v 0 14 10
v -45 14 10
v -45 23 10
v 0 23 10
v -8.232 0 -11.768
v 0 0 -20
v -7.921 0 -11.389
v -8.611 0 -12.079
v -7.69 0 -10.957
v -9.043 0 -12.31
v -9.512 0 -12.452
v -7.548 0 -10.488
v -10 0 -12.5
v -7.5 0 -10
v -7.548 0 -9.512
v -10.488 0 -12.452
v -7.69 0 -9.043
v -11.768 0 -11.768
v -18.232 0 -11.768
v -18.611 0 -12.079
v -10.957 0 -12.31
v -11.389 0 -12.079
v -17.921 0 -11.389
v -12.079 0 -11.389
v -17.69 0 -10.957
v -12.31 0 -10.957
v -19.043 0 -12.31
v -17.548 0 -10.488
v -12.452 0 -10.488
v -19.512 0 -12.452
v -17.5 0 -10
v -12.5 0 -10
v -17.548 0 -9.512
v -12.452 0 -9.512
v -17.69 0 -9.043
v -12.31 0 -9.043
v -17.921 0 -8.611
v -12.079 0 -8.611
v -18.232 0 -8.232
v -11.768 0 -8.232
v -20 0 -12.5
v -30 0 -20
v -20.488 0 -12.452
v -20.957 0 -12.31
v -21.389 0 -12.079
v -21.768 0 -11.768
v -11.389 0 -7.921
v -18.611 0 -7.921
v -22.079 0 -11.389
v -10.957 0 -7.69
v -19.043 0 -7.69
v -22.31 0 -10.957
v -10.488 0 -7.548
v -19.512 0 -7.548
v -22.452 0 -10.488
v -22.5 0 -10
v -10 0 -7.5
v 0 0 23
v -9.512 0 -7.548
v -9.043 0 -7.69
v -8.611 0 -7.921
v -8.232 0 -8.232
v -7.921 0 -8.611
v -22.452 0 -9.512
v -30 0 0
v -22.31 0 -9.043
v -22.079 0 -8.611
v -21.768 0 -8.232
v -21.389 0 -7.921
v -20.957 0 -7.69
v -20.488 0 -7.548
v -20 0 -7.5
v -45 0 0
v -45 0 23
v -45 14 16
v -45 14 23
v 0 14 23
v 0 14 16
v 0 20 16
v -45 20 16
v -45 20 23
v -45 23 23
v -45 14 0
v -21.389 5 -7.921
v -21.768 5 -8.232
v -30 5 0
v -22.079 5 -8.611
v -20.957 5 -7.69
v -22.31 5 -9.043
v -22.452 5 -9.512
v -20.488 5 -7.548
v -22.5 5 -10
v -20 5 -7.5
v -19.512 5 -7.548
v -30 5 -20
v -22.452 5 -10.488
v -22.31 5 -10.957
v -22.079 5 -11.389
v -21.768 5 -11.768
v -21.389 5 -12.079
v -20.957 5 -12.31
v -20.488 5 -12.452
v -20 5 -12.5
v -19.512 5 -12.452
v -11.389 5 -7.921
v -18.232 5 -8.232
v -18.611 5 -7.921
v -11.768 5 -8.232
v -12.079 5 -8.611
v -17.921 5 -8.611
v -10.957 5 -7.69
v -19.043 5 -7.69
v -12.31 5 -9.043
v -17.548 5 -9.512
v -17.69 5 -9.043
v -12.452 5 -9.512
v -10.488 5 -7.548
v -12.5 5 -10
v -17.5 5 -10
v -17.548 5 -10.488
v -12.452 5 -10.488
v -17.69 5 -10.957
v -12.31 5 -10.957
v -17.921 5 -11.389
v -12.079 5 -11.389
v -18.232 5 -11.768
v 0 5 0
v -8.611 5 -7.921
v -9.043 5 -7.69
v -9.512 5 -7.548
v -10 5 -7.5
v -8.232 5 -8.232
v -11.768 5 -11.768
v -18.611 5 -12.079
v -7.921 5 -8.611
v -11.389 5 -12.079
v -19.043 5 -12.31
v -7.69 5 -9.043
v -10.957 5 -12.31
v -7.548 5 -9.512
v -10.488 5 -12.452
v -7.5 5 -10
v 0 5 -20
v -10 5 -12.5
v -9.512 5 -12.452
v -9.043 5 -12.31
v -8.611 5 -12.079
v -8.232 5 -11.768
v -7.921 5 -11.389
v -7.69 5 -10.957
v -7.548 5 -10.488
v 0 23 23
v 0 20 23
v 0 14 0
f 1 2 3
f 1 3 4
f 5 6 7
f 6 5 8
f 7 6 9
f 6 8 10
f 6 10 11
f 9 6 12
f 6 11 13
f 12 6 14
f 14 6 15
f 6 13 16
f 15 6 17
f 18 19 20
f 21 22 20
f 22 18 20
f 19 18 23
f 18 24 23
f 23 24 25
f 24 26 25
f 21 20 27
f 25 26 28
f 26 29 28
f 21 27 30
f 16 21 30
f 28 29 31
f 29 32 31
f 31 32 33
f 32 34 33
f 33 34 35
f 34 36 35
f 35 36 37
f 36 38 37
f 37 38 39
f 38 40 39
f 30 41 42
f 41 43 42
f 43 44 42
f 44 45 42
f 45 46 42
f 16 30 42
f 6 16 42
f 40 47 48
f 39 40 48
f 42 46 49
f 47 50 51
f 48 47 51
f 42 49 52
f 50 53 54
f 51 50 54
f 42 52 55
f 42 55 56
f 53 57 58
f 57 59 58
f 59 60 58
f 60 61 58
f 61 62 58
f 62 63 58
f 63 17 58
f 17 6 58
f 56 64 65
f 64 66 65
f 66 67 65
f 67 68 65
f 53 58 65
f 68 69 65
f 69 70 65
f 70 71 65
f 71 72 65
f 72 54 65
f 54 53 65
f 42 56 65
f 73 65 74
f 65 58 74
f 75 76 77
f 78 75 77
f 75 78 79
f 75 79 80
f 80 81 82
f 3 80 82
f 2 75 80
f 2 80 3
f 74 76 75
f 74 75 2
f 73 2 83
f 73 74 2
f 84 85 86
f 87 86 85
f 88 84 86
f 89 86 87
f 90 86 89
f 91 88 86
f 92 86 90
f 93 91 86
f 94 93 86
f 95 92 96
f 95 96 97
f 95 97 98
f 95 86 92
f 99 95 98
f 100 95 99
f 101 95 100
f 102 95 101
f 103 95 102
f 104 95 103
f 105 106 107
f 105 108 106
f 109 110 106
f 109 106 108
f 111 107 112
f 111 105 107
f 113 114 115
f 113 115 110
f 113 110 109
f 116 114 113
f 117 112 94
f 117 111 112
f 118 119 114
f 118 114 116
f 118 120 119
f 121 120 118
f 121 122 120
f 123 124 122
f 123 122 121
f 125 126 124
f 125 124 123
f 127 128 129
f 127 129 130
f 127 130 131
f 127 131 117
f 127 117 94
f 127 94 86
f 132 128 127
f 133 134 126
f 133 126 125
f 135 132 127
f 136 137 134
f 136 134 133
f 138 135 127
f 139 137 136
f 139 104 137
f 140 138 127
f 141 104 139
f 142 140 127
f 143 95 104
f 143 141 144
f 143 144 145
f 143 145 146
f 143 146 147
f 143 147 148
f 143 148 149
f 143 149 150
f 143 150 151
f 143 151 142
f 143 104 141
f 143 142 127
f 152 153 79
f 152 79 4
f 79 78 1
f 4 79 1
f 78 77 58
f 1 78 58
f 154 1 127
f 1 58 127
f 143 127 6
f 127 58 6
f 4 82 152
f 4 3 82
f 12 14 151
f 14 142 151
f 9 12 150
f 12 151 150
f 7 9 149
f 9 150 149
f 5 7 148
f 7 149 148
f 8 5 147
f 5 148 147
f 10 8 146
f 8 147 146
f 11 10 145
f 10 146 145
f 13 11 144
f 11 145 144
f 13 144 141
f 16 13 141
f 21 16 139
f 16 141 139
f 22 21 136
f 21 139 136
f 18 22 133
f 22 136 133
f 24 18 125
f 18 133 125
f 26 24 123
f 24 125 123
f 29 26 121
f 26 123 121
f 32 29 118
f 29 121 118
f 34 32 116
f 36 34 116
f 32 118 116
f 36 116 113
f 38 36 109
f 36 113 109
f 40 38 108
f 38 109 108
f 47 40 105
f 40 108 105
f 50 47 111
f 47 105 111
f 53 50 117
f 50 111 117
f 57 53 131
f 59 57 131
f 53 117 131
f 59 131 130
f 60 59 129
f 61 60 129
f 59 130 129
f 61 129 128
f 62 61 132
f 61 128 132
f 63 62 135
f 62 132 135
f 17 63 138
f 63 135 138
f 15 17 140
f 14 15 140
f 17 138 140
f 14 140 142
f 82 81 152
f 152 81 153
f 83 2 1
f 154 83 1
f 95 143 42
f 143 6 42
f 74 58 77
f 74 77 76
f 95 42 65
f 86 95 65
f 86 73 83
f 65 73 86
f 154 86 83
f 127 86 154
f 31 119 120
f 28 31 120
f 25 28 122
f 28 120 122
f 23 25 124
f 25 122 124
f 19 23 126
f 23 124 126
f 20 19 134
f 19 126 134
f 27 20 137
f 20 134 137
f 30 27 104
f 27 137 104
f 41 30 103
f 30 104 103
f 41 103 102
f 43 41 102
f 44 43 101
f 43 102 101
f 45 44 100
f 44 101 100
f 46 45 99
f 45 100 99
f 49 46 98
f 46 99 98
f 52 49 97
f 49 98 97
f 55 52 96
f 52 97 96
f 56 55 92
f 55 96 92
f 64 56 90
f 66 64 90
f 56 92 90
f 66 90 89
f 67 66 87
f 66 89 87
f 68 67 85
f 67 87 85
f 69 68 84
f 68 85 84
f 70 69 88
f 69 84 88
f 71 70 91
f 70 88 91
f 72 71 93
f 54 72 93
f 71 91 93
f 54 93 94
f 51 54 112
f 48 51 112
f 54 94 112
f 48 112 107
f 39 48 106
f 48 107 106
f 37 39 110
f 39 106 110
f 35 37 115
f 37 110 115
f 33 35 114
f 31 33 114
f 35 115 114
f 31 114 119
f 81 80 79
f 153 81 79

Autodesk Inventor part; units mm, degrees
ref_plane "YZ Plane" through (0, 0, 0) normal (1, 0, 0) x (0, 1, 0)
ref_plane "XZ Plane" through (0, 0, 0) normal (0, 1, 0) x (-1, 0, 0)
ref_plane "XY Plane" through (0, 0, 0) normal (0, 0, 1) x (1, 0, 0)
sketch "Esboço1" plane through (0, 0, 0) normal (0, 1, 0) x (-1, 0, 0)
  line L0 (0, 0) -> (0, -20)
  line L1 (0, -20) -> (30, -20)
  line L2 (30, -20) -> (30, 0)
  line L3 (30, 0) -> (0, 0)
  circle A0 centre (15, -10) radius 2.5
  dimension "d0" = 20
  dimension "d1" = 30
  dimension "d2" = 5
extrude "Extrusão1" add sketch "Esboço1" along normal blind 5
sketch "Esboço2" plane through (0, 0, 0) normal (0, -1, 0) x (1, 0, 0)
  line L0 (0, 0) -> (0, 23)
  line L1 (0, 23) -> (-45, 23)
  line L2 (-45, 23) -> (-45, 0)
  line L3 (-45, 0) -> (0, 0)
  dimension "d5" = 23
  dimension "d6" = 45
extrude "Extrusão2" add sketch "Esboço2" against normal blind 14
sketch "Esboço3" plane through (0, 14, 0) normal (0, 1, 0) x (1, 0, 0)
  line L0 (0, -23) -> (0, 20) projected
  line L1 (0, -23) -> (0, -16)
  line L2 (0, -16) -> (-45, -16)
  line L3 (-45, 0) -> (-45, -23) projected
  line L4 (-45, -16) -> (-45, -10)
  line L5 (-45, -10) -> (0, -10)
  line L6 (0, -10) -> (0, -16)
  point P0 (0, 0)
  dimension "d9" = 7
  dimension "d10" = 6
extrude "Extrusão3" add sketch "Esboço3" along normal blind 6
sketch "Esboço4" plane through (0, 20, 0) normal (0, 1, 0) x (1, 0, 0)
  line L0 (-45, -10) -> (0, -10) projected
  line L1 (-45, -23) -> (-45, 0) projected
  line L2 (-45, -10) -> (-45, -23)
  line L3 (-45, -23) -> (0, -23) projected
  line L4 (-45, -23) -> (0, -23)
  line L5 (0, -16) -> (0, -10) projected
  line L6 (0, -23) -> (0, -10)
  line L7 (0, -10) -> (-45, -10)
  point P0 (0, 0)
extrude "Extrusão4" add sketch "Esboço4" along normal blind 3
sketch "Esboço5" plane through (-45, 0, 0) normal (-1, 0, 0) x (0, 0, 1)
  line L0 (10, 14) -> (12.7, 14)
  line L1 (12.7, 14) -> (12.7, 9.5)
  line L2 (12.7, 9.5) -> (10, 9.5)
  line L3 (10, 14) -> (10, 23) projected
  line L4 (10, 9.5) -> (10, 14)
  point P0 (0, 0)
  dimension "d15" = 2.7
  dimension "d16" = 4.5
extrude "Extrusão5" add sketch "Esboço5" along normal blind 10
offset faces "Tamanho1" outward -10 faces at (-55, 12.5, 10.9)
sketch "Esboço6" plane through (0, 5, 0) normal (0, 1, 0) x (1, 0, 0)
  line L0 (0, -23) -> (0, 20) projected
  line L1 (0, 20) -> (-15, 20)
  line L2 (0, 20) -> (-30, 20) projected
  line L3 (-15, 20) -> (-15, 10)
  circle A0 centre (-15, 10) radius 2.5
  point P0 (0, 0)
  dimension "d20" = 10
extrude "Extrusão6" add sketch "Esboço6" against normal blind 5
sketch "Esboço7" plane through (0, 5, 0) normal (0, 1, 0) x (1, 0, 0)
  line L0 (0, 20) -> (-30, 20) projected
  line L1 (0, 20) -> (-10, 20)
  line L2 (-10, 20) -> (-20, 20)
  line L3 (-20, 20) -> (-20, 10)
  line L4 (-10, 20) -> (-10, 10)
  circle A0 centre (-10, 10) radius 2.5
  circle A1 centre (-20, 10) radius 2.5
  point P0 (0, 0)
  dimension "d23" = 10
  dimension "d24" = 10
  dimension "d25" = 10
  dimension "d26" = 5
extrude "Extrusão7" cut sketch "Esboço7" against normal blind 5
properties part number "suporte p trilho"
